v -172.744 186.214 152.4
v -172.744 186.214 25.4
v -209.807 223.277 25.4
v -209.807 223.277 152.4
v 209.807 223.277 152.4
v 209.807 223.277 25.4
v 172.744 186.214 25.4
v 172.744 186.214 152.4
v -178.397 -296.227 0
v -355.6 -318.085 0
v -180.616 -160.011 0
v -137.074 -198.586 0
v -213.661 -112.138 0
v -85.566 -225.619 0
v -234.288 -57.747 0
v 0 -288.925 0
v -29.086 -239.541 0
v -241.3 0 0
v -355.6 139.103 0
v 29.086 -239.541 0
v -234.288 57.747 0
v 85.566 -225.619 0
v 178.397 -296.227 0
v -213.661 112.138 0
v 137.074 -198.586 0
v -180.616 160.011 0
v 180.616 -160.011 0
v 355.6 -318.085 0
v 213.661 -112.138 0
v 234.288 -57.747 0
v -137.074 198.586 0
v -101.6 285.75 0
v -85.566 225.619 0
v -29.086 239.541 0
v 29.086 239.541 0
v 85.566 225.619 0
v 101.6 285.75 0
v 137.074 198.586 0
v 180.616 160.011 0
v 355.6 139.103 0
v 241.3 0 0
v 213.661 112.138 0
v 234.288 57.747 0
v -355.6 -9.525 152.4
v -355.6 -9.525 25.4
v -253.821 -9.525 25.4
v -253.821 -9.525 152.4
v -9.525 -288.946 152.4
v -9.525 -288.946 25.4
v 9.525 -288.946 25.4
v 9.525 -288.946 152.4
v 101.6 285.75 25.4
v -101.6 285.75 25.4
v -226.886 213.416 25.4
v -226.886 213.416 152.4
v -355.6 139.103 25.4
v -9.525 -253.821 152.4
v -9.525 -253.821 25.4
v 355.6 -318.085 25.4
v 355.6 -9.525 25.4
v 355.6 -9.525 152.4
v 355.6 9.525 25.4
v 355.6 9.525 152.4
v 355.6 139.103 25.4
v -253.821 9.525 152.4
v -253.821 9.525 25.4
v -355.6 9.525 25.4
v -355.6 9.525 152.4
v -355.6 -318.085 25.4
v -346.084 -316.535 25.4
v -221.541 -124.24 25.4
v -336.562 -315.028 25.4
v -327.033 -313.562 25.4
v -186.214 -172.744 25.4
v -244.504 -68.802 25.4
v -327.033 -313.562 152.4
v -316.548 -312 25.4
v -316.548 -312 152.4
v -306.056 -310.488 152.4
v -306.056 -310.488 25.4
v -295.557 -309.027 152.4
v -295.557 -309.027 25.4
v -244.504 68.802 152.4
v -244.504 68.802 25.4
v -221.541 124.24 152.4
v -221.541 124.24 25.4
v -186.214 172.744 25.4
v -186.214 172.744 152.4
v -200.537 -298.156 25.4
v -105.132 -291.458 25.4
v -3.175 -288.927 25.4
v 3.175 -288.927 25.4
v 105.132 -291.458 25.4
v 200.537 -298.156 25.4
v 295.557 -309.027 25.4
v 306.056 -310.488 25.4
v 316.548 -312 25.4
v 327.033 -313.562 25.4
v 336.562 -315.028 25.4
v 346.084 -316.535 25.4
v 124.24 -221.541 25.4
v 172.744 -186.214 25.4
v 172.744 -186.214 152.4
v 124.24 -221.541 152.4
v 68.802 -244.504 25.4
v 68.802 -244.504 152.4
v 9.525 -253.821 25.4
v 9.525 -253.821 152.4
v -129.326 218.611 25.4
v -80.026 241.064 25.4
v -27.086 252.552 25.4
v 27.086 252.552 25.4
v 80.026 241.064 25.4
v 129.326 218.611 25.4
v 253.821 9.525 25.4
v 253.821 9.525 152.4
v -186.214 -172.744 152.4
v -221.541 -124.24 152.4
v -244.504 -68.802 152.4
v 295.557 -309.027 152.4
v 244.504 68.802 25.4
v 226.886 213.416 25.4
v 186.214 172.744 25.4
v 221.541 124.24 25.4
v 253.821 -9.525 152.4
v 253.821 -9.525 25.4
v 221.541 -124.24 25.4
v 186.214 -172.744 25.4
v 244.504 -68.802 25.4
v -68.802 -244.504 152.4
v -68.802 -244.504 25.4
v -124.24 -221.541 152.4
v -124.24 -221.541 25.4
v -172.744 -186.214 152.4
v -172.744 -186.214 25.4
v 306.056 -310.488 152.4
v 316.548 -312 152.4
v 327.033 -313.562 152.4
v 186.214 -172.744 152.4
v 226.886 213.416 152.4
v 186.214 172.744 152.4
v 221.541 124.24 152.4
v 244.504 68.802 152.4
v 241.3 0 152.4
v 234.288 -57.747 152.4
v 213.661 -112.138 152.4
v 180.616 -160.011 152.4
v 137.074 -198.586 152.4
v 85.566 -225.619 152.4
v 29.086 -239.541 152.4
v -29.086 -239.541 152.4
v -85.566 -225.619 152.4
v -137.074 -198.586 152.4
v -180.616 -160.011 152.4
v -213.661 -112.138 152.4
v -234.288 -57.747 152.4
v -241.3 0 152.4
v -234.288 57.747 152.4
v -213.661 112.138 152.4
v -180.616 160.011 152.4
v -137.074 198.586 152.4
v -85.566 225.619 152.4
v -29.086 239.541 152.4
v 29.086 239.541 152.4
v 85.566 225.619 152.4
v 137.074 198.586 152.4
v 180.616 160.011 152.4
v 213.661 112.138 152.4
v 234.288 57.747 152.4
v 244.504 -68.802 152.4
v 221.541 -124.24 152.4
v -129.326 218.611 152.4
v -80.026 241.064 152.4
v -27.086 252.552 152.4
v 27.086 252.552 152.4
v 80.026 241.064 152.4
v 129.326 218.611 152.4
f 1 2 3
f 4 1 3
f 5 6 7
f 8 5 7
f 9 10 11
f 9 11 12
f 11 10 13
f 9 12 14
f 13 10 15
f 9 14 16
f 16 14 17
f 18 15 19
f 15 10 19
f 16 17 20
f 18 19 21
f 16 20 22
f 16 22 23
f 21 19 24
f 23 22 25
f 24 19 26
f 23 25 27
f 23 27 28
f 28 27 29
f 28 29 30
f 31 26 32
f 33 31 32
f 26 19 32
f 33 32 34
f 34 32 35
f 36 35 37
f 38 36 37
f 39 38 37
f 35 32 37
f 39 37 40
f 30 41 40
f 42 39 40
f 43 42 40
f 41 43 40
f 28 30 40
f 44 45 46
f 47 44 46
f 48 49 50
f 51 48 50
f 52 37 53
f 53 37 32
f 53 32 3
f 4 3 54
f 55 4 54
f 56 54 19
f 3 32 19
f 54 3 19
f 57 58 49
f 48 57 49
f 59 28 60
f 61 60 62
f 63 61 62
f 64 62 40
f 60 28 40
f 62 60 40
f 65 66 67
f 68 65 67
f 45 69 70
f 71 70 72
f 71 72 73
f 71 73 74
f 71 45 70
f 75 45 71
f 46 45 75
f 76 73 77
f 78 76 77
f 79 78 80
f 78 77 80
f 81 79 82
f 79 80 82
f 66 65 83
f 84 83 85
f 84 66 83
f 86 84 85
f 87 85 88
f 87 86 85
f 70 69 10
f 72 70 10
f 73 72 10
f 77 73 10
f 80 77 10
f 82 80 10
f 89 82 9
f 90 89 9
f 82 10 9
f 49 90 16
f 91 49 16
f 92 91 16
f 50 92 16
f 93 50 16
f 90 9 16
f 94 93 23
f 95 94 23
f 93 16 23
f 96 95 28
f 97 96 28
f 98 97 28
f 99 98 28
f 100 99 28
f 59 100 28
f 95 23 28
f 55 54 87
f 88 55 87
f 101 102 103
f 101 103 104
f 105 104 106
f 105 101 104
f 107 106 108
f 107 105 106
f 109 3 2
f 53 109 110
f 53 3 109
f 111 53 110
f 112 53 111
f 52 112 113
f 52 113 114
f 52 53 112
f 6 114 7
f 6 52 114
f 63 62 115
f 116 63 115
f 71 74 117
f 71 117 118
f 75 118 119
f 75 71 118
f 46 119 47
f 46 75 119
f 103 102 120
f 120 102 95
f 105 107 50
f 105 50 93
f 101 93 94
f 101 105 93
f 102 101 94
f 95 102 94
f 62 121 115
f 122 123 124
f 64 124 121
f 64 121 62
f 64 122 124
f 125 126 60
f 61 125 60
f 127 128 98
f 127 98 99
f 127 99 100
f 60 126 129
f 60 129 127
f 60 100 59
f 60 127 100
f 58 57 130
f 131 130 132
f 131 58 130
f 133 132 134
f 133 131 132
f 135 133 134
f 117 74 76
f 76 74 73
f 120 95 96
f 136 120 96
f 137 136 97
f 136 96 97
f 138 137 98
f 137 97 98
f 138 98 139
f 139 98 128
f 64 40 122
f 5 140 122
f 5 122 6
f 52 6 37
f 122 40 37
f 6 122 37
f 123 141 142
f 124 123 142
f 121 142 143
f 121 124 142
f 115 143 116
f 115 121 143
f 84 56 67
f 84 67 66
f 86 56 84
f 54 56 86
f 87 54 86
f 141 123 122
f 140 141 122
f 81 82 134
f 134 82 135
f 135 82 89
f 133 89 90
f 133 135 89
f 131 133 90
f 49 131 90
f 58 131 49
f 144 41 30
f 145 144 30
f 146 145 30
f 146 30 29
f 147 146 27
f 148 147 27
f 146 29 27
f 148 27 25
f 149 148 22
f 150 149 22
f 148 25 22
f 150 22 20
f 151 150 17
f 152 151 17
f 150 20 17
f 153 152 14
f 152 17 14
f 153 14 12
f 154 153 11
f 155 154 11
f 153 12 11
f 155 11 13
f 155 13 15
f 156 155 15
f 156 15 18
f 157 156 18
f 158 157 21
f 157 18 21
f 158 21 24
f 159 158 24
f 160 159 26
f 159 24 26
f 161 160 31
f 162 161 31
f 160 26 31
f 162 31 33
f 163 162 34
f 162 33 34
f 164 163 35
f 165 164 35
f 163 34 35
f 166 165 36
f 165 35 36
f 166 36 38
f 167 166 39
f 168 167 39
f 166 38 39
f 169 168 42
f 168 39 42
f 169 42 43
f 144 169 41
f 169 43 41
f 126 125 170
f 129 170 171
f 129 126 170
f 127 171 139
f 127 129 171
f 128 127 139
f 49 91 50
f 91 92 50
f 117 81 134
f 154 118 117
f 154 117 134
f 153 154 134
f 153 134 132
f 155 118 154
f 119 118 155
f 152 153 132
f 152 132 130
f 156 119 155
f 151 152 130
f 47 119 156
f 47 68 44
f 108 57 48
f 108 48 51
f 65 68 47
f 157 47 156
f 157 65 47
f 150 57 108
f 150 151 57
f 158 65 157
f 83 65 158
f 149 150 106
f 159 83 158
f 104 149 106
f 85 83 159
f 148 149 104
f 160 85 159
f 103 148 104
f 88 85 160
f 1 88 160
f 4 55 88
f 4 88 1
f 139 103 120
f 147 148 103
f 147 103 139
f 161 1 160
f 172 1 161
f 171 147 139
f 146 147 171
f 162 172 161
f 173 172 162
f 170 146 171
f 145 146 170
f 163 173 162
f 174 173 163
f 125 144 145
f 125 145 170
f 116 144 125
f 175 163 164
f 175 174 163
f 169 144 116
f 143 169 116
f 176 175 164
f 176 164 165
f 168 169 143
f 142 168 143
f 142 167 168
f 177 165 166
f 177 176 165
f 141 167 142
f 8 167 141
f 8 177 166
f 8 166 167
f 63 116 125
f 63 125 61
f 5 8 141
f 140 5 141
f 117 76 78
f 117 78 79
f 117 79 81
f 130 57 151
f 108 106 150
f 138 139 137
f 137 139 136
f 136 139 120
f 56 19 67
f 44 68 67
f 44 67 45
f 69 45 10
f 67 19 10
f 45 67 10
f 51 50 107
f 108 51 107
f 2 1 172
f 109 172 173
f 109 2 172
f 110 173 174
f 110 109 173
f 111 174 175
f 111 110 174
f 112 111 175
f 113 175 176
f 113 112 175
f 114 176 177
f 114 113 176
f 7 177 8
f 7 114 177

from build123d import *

# Parameters (mm, degrees)
F1_DEPTH = 25.4
F3_DEPTH = 127
F4_R     = 254
F5_DEPTH = 152.4
F6_R     = 241.3
F7_DEPTH = 152.4


with BuildPart() as f1:
    # F0 (on Top) → F1 (new body)
    with BuildSketch(Plane.XY):
        with BuildLine():
            Line((-355.6, 139.1030316258), (-355.6, -318.0850094258))
            ThreePointArc((-355.6, -318.0850094258), (0, -288.925), (355.6, -318.0850094258))
            Line((355.6, -318.0850094258), (355.6, 139.1030316258))
            Line((355.6, 139.1030316258), (101.6, 285.75))
            Line((101.6, 285.75), (-101.6, 285.75))
            Line((-101.6, 285.75), (-355.6, 139.1030316258))
        make_face()
    extrude(amount=F1_DEPTH)

    # F2 (on face) → F3 (join)
    with BuildSketch(Plane.XY.offset(25.4)):
        with BuildLine():
            Line((-209.8065405207, 223.2769247023), (-226.8863032655, 213.4159190839))
            Line((-226.8863032655, 213.4159190839), (-60.1941220043, 46.7237378227))
            ThreePointArc((-60.1941220043, 46.7237378227), (-53.8815367264, 53.8815367264), (-46.7237378227, 60.1941220043))
            Line((-46.7237378227, 60.1941220043), (-209.8065405207, 223.2769247023))
        make_face()
        with BuildLine():
            Line((-60.1941220043, -46.7237378227), (-327.0327279417, -313.5623437601))
            ThreePointArc((-327.0327279417, -313.5623437601), (-311.302932669, -311.2373508984), (-295.5566184449, -309.0270026265))
            Line((-295.5566184449, -309.0270026265), (-46.7237378227, -60.1941220043))
            ThreePointArc((-46.7237378227, -60.1941220043), (-53.8815367264, -53.8815367264), (-60.1941220043, -46.7237378227))
        make_face()
        with BuildLine():
            Line((-75.6023437137, 9.525), (-355.6, 9.525))
            Line((-355.6, 9.525), (-355.6, -9.525))
            Line((-355.6, -9.525), (-75.6023437137, -9.525))
            ThreePointArc((-75.6023437137, -9.525), (-76.2, 0), (-75.6023437137, 9.525))
        make_face()
        with BuildLine():
            Line((226.8863032655, 213.4159190839), (209.8065405207, 223.2769247023))
            Line((209.8065405207, 223.2769247023), (46.7237378227, 60.1941220043))
            ThreePointArc((46.7237378227, 60.1941220043), (53.8815367264, 53.8815367264), (60.1941220043, 46.7237378227))
            Line((60.1941220043, 46.7237378227), (226.8863032655, 213.4159190839))
        make_face()
        with BuildLine():
            Line((355.6, -9.525), (355.6, 9.525))
            Line((355.6, 9.525), (75.6023437137, 9.525))
            ThreePointArc((75.6023437137, 9.525), (76.2, 0), (75.6023437137, -9.525))
            Line((75.6023437137, -9.525), (355.6, -9.525))
        make_face()
        with BuildLine():
            Line((46.7237378227, -60.1941220043), (295.5566184449, -309.0270026265))
            ThreePointArc((295.5566184449, -309.0270026265), (311.302932669, -311.2373508984), (327.0327279417, -313.5623437601))
            Line((327.0327279417, -313.5623437601), (60.1941220043, -46.7237378227))
            ThreePointArc((60.1941220043, -46.7237378227), (53.8815367264, -53.8815367264), (46.7237378227, -60.1941220043))
        make_face()
        with BuildLine():
            Line((-9.525, -75.6023437137), (-9.525, -288.9457819171))
            Line((-9.525, -288.9457819171), (9.525, -288.9457819171))
            Line((9.525, -288.9457819171), (9.525, -75.6023437137))
            ThreePointArc((9.525, -75.6023437137), (0, -76.2), (-9.525, -75.6023437137))
        make_face()
    extrude(amount=F3_DEPTH)

    # F4 (on face) → F5 (join, through all)
    with BuildSketch(Plane(origin=(0, 0, 0), x_dir=(1, 0, 0), z_dir=(0, 0, -1))):
        Circle(F4_R)
    extrude(amount=-F5_DEPTH)

    # F6 (on face) → F7 (cut, through all)
    with BuildSketch(Plane(origin=(0, 0, 0), x_dir=(1, 0, 0), z_dir=(0, 0, -1))):
        Circle(F6_R)
    extrude(amount=-F7_DEPTH, mode=Mode.SUBTRACT)


solid = f1.part
